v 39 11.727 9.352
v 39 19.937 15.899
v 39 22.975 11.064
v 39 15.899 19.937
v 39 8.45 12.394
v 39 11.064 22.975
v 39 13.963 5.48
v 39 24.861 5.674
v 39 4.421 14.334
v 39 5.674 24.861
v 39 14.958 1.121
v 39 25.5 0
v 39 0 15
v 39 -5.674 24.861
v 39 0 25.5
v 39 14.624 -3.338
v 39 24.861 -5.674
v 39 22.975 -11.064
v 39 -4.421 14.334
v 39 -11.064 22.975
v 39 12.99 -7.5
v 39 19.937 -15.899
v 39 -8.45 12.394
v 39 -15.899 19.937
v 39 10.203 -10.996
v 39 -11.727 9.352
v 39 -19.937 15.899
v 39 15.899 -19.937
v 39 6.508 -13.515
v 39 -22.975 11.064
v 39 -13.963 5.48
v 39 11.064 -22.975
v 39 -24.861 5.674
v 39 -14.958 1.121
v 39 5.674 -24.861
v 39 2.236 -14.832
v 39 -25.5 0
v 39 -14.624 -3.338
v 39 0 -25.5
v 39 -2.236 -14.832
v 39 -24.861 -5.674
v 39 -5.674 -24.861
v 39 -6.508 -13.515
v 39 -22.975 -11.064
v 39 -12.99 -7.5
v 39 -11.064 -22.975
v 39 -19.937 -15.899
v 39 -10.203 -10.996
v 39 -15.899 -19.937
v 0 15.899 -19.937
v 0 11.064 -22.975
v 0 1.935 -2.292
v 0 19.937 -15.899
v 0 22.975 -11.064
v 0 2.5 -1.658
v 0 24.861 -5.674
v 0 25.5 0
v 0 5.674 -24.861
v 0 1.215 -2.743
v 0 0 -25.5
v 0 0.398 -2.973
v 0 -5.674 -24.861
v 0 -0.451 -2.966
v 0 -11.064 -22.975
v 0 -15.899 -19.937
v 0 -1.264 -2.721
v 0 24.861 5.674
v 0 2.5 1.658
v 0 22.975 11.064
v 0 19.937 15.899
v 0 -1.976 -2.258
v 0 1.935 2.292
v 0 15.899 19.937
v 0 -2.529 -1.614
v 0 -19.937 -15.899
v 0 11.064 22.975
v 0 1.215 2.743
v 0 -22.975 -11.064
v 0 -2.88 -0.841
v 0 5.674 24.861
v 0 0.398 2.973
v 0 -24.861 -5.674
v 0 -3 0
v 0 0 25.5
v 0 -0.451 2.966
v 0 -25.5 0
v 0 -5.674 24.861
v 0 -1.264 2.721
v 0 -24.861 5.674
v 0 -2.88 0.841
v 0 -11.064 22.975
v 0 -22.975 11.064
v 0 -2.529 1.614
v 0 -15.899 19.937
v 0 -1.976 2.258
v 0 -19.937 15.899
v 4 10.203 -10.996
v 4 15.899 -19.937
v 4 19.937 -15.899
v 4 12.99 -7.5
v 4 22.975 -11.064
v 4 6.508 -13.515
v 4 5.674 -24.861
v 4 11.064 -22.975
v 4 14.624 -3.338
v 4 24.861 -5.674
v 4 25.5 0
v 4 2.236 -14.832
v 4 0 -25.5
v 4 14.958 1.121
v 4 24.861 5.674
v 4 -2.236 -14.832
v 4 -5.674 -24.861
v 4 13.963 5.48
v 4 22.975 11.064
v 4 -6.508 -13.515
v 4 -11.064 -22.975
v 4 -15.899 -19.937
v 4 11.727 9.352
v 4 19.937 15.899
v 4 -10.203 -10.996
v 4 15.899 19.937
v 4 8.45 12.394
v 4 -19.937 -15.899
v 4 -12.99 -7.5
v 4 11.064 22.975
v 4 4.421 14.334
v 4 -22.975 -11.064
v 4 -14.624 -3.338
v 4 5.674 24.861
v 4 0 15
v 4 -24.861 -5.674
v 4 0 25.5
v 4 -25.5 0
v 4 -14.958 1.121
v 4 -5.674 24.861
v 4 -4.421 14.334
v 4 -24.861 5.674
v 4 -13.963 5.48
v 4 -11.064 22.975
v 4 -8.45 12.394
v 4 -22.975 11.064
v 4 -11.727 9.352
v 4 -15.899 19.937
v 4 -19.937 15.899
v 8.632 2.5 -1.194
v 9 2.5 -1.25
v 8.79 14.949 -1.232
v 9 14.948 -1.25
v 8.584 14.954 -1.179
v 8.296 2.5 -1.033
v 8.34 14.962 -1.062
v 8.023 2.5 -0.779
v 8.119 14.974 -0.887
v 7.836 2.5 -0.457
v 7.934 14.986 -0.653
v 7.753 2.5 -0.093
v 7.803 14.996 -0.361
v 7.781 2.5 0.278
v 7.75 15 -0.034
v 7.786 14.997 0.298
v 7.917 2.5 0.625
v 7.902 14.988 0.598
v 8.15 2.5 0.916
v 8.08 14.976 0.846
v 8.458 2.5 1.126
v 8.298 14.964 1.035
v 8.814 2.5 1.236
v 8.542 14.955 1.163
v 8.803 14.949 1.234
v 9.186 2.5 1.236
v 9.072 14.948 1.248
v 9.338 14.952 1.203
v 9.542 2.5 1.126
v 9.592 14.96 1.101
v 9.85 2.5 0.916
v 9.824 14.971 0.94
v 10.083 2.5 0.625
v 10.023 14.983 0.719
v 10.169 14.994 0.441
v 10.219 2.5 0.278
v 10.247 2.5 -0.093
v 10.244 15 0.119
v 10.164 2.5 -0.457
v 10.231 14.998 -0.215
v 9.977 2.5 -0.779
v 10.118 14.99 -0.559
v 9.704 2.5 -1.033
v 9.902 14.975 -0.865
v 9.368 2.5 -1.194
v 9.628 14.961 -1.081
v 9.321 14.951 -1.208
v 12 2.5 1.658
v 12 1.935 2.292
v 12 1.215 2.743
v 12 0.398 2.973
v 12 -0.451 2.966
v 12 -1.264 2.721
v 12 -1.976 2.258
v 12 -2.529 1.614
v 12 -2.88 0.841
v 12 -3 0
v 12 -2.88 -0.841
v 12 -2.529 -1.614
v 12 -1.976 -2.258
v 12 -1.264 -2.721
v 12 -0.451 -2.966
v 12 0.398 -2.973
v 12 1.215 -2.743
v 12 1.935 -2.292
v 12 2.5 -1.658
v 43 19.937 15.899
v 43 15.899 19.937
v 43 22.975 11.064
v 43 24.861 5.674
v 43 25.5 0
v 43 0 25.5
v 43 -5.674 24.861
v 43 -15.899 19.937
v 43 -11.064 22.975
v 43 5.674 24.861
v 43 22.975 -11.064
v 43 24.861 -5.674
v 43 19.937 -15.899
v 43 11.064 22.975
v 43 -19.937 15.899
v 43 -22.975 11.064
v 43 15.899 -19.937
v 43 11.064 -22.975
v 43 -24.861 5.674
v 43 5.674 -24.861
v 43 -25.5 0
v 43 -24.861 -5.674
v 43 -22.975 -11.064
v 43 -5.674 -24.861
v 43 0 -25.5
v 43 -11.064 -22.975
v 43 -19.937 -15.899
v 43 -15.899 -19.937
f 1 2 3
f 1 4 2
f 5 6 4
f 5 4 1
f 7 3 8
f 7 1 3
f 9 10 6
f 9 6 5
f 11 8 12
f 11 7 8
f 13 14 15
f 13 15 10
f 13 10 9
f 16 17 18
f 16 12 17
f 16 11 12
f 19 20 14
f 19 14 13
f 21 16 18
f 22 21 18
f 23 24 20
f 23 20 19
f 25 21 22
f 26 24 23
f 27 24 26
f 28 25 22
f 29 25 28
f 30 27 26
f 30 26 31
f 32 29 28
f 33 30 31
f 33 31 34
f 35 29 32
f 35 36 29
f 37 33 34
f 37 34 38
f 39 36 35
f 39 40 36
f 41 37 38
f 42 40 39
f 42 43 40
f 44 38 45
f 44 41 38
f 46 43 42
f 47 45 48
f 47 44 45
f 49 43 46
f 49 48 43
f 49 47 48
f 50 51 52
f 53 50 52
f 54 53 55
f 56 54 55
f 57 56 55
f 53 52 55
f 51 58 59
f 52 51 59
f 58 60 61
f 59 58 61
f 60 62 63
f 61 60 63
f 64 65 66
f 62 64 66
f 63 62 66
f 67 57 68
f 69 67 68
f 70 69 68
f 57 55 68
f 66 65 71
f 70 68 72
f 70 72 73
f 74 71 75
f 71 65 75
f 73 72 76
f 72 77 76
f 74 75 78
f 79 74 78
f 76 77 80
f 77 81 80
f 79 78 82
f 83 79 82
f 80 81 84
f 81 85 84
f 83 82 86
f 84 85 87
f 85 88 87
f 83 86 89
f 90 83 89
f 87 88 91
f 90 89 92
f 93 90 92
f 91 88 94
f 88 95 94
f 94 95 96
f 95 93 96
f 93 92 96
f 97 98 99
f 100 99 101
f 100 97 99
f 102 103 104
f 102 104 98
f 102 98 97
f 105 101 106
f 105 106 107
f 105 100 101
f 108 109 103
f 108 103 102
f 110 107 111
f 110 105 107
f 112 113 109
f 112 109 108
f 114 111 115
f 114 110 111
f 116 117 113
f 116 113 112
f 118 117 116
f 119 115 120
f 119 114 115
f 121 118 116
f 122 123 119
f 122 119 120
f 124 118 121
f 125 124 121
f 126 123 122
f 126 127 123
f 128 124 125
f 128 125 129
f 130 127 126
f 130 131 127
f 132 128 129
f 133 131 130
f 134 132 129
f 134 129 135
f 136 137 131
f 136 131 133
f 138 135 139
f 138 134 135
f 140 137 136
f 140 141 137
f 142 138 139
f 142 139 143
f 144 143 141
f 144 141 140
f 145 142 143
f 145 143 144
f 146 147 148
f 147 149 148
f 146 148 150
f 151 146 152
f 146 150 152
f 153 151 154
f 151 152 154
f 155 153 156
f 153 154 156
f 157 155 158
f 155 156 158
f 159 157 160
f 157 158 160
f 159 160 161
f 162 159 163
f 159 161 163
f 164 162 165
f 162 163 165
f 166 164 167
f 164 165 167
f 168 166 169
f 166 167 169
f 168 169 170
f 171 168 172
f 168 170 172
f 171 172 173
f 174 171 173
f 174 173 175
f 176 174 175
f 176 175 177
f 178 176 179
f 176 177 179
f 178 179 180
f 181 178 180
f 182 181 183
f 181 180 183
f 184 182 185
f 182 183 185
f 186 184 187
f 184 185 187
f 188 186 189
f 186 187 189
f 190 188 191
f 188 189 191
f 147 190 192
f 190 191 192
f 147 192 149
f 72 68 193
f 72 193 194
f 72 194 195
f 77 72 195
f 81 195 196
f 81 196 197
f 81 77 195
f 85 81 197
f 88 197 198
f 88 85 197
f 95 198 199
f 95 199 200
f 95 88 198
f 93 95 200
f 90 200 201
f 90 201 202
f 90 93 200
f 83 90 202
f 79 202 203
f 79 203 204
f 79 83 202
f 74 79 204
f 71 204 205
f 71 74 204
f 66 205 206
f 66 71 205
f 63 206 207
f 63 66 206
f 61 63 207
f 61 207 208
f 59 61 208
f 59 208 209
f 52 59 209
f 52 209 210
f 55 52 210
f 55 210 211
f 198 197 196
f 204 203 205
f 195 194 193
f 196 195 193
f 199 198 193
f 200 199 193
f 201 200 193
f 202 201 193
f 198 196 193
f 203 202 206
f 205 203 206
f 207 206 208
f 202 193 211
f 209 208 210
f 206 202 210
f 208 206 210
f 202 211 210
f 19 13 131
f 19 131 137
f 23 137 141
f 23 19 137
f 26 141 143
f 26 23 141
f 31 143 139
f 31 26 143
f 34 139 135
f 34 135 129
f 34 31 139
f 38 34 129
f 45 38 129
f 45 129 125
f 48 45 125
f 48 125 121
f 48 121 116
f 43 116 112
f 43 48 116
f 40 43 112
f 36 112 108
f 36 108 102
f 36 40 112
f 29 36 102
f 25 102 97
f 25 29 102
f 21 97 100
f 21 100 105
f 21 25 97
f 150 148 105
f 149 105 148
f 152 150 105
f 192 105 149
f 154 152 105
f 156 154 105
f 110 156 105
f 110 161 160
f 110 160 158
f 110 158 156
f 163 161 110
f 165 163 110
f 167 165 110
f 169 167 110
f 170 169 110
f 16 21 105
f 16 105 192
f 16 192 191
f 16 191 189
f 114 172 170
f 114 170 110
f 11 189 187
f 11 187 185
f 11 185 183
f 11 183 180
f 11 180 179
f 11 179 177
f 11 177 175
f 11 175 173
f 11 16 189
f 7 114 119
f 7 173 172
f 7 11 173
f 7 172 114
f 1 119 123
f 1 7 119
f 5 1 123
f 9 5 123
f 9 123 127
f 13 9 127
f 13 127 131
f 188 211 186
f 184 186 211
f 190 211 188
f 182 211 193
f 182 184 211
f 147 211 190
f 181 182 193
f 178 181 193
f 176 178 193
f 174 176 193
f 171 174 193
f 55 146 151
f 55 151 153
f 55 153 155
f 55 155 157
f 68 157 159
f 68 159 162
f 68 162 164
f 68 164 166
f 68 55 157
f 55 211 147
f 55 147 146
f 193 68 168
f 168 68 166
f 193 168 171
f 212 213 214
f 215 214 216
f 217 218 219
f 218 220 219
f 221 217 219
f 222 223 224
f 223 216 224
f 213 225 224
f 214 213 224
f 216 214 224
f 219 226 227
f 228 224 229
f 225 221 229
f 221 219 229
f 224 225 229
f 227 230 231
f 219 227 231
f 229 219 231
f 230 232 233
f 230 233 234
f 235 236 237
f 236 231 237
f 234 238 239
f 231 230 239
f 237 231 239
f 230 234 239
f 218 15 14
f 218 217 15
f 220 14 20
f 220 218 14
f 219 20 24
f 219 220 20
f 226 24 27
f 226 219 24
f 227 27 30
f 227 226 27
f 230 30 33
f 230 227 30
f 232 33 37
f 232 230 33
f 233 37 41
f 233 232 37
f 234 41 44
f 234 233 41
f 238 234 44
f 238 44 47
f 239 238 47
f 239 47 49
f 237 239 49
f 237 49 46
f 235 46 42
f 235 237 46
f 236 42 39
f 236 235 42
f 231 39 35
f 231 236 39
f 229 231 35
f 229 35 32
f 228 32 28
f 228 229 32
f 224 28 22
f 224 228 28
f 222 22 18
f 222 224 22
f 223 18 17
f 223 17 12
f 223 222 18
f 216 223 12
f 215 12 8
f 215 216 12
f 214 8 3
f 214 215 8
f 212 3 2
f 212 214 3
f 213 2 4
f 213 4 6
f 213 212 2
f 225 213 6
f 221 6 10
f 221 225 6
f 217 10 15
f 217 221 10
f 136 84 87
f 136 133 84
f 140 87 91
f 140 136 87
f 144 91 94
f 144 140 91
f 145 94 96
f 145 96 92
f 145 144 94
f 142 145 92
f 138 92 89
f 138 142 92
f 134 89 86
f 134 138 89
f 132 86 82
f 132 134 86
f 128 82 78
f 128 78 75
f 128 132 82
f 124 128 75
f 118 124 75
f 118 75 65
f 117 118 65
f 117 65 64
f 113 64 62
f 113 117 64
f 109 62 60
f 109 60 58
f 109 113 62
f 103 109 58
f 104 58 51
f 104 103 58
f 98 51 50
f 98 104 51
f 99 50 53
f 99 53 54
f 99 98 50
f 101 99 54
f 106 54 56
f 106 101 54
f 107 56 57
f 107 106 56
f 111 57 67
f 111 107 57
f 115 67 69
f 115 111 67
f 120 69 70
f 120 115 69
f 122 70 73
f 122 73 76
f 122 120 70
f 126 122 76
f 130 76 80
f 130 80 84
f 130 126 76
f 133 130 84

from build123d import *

# Parameters (mm, degrees)
SKETCH7_W          = 1.25
SKETCH7_H          = 15
CUT_EXTRUDE1_DEPTH = 12


with BuildPart() as part:
    # Sketch1 → Revolve1 (revolve)
    with BuildSketch(Plane.XY, mode=Mode.PRIVATE) as revolve1_sk:
        Polygon((0, 0), (0, 3), (0, 25.5), (4, 25.5), (4, 15), (39, 15), (39, 25.5), (43, 25.5), (43, 3), (43, 0), align=None)
    revolve(revolve1_sk.sketch.rotate(Axis((0, 0, 0), (1, 0, 0)), 90), axis=Axis((0, 0, 0), (1, 0, 0)))

    # Sketch7 → M3 Tapped Hole1 (revolve, cut)
    with BuildSketch(Plane(origin=(9, 0, 0), x_dir=(0, 0, -1), z_dir=(1, 0, 0))):
        with Locations((0.625, 7.5)):
            Rectangle(SKETCH7_W, SKETCH7_H)
    revolve(axis=Axis((9, -6.35, 0), (0, 1, 0)), mode=Mode.SUBTRACT)

    # Sketch8 → Cut-Extrude1 (cut)
    with BuildSketch(Plane.ZY):
        with BuildLine():
            Line((-1.658312395, 2.5), (1.658312395, 2.5))
            ThreePointArc((1.658312395, 2.5), (0, -3), (-1.658312395, 2.5))
        make_face()
    extrude(amount=-CUT_EXTRUDE1_DEPTH, mode=Mode.SUBTRACT)


solid = part.part
